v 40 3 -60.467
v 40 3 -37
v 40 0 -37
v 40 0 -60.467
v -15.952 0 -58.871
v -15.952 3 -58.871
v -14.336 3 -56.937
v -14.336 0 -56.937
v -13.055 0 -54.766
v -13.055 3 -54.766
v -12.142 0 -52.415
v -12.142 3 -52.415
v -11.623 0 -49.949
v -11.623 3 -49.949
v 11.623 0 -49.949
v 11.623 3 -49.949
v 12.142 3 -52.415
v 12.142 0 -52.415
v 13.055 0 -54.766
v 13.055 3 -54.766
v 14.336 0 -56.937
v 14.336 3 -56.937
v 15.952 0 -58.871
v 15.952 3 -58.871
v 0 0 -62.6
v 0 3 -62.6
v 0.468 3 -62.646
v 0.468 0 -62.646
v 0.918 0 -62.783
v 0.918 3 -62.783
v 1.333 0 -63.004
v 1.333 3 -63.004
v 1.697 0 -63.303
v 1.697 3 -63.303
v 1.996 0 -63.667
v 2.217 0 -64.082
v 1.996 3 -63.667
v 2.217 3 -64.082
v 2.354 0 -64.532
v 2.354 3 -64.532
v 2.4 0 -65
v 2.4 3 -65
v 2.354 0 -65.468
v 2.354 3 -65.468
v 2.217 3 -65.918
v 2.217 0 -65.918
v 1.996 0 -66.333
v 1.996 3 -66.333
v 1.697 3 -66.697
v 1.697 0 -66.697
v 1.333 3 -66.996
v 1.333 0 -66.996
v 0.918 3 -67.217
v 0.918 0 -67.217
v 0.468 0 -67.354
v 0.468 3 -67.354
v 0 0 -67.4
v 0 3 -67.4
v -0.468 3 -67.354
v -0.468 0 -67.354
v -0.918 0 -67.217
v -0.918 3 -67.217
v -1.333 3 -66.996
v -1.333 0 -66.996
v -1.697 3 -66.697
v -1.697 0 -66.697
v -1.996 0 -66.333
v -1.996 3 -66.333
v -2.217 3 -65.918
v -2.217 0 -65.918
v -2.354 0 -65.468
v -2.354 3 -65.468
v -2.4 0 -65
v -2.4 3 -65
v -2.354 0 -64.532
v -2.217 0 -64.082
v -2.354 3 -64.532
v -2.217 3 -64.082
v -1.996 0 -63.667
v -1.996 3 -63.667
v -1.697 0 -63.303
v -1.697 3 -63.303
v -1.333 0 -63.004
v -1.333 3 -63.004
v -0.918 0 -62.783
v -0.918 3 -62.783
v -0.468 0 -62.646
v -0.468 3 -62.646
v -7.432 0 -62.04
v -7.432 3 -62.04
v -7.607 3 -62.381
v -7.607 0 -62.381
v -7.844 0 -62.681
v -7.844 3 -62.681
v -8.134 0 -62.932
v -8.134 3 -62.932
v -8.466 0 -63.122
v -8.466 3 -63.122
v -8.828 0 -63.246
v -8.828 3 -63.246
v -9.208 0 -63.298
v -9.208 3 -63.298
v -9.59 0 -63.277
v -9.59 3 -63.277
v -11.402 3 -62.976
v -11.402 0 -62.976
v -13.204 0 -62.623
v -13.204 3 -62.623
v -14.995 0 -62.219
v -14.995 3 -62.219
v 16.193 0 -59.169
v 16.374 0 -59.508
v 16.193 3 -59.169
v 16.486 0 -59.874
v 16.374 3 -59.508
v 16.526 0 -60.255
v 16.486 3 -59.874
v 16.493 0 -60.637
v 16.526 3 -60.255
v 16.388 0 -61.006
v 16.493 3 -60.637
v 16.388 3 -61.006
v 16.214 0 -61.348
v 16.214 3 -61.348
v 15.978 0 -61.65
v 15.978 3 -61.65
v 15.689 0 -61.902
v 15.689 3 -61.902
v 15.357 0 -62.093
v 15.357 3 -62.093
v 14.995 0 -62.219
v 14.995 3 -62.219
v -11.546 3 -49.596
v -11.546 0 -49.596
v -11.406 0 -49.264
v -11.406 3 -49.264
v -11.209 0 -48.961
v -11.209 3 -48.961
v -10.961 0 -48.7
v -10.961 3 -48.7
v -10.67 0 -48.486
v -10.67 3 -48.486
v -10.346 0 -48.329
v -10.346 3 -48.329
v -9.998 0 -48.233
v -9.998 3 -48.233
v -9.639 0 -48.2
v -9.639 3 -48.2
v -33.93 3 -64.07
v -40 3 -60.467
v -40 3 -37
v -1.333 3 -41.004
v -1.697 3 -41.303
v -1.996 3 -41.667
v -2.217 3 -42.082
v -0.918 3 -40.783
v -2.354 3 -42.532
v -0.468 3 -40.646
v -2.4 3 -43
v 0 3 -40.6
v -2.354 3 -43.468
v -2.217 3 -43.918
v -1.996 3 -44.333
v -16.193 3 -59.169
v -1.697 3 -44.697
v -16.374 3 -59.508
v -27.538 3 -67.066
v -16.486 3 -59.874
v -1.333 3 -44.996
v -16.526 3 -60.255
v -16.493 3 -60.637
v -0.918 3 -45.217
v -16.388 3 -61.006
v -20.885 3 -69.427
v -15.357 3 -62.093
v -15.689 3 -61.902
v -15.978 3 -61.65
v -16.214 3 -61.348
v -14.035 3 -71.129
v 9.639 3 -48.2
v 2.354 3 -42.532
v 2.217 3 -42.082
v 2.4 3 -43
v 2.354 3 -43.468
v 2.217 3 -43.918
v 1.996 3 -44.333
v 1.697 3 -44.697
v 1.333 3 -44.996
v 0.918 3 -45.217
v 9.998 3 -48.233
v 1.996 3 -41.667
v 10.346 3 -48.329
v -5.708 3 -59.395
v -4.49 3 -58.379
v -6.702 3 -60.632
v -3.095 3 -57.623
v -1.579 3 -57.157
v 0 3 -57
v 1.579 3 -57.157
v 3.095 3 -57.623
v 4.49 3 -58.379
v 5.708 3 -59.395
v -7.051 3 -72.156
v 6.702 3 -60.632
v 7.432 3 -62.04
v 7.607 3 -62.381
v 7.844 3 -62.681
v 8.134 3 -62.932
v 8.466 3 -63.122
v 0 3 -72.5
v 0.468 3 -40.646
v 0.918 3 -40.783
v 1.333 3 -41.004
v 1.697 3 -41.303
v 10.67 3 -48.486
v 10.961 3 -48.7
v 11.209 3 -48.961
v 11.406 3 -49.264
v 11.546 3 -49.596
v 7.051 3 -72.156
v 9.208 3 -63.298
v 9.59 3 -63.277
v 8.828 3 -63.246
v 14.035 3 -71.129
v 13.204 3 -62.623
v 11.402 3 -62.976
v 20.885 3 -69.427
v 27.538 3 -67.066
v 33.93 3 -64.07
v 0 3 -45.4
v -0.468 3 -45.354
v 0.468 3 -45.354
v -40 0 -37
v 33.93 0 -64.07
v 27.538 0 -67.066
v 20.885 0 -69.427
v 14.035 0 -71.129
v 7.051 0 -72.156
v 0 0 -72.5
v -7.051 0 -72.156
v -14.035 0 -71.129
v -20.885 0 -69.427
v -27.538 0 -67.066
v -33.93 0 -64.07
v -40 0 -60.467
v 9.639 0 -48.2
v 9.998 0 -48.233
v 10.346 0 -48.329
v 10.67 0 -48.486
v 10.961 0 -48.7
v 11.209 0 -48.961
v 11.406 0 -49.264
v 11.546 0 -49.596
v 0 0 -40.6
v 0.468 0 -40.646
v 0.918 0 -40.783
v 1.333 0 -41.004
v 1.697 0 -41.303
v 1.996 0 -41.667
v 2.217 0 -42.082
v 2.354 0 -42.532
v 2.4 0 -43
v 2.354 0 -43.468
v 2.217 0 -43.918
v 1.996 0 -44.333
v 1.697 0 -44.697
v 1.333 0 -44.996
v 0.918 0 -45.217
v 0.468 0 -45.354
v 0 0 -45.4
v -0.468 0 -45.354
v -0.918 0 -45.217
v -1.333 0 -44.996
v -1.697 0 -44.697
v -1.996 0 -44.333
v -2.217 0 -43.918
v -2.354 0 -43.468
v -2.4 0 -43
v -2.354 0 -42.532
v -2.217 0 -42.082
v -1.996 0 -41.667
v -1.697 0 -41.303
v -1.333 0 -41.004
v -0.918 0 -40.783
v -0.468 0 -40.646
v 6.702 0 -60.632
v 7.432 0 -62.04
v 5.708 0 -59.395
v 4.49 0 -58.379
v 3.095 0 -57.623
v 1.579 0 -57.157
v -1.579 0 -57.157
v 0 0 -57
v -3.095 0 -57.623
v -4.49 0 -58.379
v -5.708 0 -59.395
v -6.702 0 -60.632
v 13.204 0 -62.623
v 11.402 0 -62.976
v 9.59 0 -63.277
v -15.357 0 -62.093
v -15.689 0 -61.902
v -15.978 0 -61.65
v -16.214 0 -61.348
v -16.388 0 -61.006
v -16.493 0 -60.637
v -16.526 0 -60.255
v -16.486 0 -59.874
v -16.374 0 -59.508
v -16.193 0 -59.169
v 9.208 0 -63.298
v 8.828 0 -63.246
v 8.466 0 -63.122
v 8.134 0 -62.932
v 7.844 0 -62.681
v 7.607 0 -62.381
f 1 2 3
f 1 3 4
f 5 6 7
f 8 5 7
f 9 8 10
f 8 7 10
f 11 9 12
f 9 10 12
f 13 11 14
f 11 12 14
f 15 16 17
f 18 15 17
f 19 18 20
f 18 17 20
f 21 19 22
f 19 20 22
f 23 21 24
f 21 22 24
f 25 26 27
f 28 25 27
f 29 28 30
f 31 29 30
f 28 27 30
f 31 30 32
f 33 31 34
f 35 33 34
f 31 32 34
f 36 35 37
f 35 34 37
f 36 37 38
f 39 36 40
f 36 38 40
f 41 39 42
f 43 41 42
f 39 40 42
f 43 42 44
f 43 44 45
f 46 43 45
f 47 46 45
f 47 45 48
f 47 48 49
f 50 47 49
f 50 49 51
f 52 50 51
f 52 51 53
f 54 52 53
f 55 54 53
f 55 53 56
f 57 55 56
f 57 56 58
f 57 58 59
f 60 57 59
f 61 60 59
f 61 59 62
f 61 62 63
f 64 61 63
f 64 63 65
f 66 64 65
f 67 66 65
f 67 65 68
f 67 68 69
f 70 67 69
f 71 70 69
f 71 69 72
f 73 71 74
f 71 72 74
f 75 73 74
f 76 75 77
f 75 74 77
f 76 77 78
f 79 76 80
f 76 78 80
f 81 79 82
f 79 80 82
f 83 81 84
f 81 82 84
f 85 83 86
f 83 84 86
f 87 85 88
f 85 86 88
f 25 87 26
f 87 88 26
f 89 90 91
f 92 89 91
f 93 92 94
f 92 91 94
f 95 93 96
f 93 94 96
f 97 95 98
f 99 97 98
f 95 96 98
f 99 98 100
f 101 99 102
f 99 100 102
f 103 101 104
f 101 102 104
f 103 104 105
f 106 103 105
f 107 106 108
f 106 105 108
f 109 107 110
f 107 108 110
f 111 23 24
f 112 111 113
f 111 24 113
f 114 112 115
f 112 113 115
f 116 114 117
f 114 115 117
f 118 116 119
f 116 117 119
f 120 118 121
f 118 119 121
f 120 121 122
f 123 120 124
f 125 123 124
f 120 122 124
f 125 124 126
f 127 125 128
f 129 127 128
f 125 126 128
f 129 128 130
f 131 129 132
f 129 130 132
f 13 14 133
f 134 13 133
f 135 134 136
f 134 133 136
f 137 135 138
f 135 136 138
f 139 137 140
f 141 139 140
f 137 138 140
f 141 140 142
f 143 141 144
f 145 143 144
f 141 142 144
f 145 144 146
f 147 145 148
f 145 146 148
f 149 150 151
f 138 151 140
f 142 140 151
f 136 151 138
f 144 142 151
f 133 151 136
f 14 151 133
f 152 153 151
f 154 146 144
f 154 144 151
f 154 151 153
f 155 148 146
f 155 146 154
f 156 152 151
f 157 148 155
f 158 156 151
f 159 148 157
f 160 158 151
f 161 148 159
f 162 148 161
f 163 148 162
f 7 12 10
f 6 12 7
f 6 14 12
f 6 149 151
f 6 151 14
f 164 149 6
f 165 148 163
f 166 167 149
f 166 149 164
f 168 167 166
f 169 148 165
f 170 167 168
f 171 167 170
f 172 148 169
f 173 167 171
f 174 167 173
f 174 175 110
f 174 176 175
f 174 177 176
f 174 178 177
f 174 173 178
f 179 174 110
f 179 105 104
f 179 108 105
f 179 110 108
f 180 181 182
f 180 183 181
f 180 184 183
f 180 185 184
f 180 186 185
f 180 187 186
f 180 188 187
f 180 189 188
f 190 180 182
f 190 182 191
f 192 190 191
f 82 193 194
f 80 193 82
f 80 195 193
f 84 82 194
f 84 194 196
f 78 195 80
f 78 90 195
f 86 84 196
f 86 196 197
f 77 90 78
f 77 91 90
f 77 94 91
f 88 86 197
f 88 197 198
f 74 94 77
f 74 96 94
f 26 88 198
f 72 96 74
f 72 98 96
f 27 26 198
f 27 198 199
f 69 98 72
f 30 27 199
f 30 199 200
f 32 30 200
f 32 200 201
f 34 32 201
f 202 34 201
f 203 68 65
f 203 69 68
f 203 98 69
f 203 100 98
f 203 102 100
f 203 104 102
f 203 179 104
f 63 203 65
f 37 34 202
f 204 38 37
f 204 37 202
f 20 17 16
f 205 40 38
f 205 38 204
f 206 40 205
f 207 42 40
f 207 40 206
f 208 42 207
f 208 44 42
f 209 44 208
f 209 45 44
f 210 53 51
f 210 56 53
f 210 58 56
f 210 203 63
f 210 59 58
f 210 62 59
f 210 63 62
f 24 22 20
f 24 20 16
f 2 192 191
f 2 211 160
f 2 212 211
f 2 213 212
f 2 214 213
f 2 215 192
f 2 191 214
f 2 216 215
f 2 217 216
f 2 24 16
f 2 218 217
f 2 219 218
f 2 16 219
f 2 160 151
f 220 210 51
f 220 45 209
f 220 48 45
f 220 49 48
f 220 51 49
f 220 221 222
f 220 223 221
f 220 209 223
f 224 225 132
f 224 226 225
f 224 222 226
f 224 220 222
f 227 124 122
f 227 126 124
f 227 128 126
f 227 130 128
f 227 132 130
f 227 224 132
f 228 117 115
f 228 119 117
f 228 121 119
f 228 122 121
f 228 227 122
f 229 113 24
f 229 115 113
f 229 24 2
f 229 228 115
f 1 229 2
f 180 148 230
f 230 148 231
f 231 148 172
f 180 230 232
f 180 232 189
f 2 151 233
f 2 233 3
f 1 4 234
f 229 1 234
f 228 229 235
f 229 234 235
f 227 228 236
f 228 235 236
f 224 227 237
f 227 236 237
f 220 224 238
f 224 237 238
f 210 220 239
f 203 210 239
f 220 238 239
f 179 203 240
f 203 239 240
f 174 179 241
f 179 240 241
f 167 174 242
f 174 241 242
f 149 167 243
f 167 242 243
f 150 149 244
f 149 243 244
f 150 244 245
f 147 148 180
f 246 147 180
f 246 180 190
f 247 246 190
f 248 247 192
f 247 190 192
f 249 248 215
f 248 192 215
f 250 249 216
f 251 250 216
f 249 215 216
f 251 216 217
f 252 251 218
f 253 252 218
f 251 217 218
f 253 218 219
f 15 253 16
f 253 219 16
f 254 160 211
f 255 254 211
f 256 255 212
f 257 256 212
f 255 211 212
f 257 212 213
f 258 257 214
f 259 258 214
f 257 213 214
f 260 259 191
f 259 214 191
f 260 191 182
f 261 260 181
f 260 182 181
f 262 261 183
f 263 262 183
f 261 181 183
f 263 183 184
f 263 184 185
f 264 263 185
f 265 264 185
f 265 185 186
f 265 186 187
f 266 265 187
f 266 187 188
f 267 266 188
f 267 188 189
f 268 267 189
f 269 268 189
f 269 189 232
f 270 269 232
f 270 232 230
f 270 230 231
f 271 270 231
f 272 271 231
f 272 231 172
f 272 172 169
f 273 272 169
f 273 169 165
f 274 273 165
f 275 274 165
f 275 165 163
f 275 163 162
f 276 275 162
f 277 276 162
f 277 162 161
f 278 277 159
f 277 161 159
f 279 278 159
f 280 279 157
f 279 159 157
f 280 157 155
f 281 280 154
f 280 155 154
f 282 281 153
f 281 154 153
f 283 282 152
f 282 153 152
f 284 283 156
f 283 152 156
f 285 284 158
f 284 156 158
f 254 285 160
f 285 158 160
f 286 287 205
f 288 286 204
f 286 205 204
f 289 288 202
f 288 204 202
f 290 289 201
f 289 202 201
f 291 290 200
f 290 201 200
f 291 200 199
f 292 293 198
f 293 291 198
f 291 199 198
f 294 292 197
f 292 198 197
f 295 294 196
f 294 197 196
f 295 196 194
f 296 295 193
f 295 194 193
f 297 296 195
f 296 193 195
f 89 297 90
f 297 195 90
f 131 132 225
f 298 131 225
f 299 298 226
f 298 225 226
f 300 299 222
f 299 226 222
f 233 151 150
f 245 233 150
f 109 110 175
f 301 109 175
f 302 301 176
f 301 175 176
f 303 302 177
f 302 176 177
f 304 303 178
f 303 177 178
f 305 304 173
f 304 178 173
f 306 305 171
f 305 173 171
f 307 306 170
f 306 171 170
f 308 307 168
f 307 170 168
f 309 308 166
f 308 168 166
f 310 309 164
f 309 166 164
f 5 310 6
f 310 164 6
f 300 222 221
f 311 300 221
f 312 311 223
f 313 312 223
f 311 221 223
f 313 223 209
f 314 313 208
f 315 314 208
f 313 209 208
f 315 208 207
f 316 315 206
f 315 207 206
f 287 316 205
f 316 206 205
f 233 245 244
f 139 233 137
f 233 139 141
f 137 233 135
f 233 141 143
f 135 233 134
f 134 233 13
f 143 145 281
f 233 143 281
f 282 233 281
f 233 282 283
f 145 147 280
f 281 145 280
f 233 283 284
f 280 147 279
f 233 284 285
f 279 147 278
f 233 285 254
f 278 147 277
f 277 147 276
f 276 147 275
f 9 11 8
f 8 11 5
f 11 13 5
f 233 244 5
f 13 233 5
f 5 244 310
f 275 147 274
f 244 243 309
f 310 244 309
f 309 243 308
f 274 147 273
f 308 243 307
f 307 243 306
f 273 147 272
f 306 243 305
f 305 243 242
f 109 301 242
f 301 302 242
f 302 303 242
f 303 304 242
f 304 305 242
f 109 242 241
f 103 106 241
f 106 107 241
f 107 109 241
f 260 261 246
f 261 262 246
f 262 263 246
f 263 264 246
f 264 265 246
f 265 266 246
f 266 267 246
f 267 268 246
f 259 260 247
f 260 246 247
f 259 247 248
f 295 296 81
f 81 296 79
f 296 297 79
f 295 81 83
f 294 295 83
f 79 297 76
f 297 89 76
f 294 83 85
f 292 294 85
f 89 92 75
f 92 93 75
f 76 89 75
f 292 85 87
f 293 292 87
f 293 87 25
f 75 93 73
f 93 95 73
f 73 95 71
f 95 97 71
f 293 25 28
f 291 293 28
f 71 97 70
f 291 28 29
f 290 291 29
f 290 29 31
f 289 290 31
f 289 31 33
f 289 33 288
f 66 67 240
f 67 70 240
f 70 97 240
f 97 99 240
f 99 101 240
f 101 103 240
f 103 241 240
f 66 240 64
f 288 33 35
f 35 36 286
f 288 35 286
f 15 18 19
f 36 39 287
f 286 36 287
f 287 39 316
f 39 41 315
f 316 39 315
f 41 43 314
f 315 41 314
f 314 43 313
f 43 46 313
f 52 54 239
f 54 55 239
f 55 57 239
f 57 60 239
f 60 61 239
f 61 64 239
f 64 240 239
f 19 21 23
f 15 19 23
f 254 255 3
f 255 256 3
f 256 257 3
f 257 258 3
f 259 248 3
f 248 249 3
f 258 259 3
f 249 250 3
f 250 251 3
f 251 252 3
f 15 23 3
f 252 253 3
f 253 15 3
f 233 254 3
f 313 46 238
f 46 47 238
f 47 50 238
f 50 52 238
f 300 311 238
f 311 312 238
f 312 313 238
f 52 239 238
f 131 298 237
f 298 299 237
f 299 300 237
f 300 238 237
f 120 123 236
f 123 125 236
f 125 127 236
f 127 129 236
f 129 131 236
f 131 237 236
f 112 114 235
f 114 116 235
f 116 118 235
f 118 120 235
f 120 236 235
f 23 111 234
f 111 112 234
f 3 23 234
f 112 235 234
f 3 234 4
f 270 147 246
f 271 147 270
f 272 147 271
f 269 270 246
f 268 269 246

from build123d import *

# Parameters (mm, degrees)
BOSS_EXTRUDE1_DEPTH  = 3
CUT_EXTRUDE14_DEPTH  = 103.574363269
SKETCH14_OUTSIDE_W   = 186.736
SKETCH14_OUTSIDE_H   = 177.534
SKETCH14_OUTSIDE_W_2 = 80
SKETCH14_OUTSIDE_H_2 = 40
CUT_EXTRUDE15_DEPTH  = 103.574363269
SKETCH15_R           = 2.4
CUT_EXTRUDE16_DEPTH  = 83.856804186


with BuildPart() as part:
    # Sketch1 → Boss-Extrude1 (new body)
    with BuildSketch(Plane(origin=(0, 0, 0), x_dir=(1, 0, 0), z_dir=(0, 1, 0))):
        with BuildLine():
            ThreePointArc((36.543377003, -62.616544118), (0, 72.5), (-36.543377003, -62.616544118))
            ThreePointArc((-36.543377003, -62.616544118), (-33.085954668, -63.20954405), (-30.089832649, -61.38507948))
            ThreePointArc((-30.089832649, -61.38507948), (0, -46.75), (30.089832649, -61.38507948))
            ThreePointArc((30.089832649, -61.38507948), (33.085954668, -63.20954405), (36.543377003, -62.616544118))
        make_face()
    extrude(amount=BOSS_EXTRUDE1_DEPTH)

    # Sketch13 → Cut-Extrude14 (cut, through all)
    with BuildSketch(Plane(origin=(0, 3, 0), x_dir=(1, 0, 0), z_dir=(0, 1, 0))):
        with BuildLine():
            ThreePointArc((-11.622969422, 49.948571429), (-10.961172041, 48.699523885), (-9.638836445, 48.2))
            Line((-9.638836445, 48.2), (9.638836445, 48.2))
            ThreePointArc((9.638836445, 48.2), (10.961172041, 48.699523885), (11.622969422, 49.948571429))
            ThreePointArc((11.622969422, 49.948571429), (13.054510917, 54.765599326), (15.951885484, 58.871484058))
            ThreePointArc((15.951885484, 58.871484058), (16.449270482, 60.8240474), (14.994913363, 62.21858704))
            ThreePointArc((14.994913363, 62.21858704), (12.303854546, 62.806171379), (9.590005203, 63.277419355))
            ThreePointArc((9.590005203, 63.277419355), (8.295362524, 63.03495375), (7.432254032, 62.04))
            ThreePointArc((7.432254032, 62.04), (0, 57), (-7.432254032, 62.04))
            ThreePointArc((-7.432254032, 62.04), (-8.295362524, 63.03495375), (-9.590005203, 63.277419355))
            ThreePointArc((-9.590005203, 63.277419355), (-12.303854546, 62.806171379), (-14.994913363, 62.21858704))
            ThreePointArc((-14.994913363, 62.21858704), (-16.449270482, 60.8240474), (-15.951885484, 58.871484058))
            ThreePointArc((-15.951885484, 58.871484058), (-13.054510917, 54.765599326), (-11.622969422, 49.948571429))
        make_face()
    extrude(amount=-CUT_EXTRUDE14_DEPTH, mode=Mode.SUBTRACT)

    # Sketch14 outside → Cut-Extrude15 (cut, through all)
    with BuildSketch(Plane(origin=(0, 3, 0), x_dir=(1, 0, 0), z_dir=(0, 1, 0))):
        with Locations((0, 4.601)):
            Rectangle(SKETCH14_OUTSIDE_W, SKETCH14_OUTSIDE_H)
        with Locations((0, 57)):
            Rectangle(SKETCH14_OUTSIDE_W_2, SKETCH14_OUTSIDE_H_2, mode=Mode.SUBTRACT)
    extrude(amount=-CUT_EXTRUDE15_DEPTH, mode=Mode.SUBTRACT)

    # Sketch15 → Cut-Extrude16 (cut, through all)
    with BuildSketch(Plane(origin=(0, 3, 0), x_dir=(1, 0, 0), z_dir=(0, 1, 0))):
        with Locations((0, 65)):
            Circle(SKETCH15_R)
        with Locations((0, 43)):
            Circle(SKETCH15_R)
    extrude(amount=-CUT_EXTRUDE16_DEPTH, mode=Mode.SUBTRACT)


solid = part.part
